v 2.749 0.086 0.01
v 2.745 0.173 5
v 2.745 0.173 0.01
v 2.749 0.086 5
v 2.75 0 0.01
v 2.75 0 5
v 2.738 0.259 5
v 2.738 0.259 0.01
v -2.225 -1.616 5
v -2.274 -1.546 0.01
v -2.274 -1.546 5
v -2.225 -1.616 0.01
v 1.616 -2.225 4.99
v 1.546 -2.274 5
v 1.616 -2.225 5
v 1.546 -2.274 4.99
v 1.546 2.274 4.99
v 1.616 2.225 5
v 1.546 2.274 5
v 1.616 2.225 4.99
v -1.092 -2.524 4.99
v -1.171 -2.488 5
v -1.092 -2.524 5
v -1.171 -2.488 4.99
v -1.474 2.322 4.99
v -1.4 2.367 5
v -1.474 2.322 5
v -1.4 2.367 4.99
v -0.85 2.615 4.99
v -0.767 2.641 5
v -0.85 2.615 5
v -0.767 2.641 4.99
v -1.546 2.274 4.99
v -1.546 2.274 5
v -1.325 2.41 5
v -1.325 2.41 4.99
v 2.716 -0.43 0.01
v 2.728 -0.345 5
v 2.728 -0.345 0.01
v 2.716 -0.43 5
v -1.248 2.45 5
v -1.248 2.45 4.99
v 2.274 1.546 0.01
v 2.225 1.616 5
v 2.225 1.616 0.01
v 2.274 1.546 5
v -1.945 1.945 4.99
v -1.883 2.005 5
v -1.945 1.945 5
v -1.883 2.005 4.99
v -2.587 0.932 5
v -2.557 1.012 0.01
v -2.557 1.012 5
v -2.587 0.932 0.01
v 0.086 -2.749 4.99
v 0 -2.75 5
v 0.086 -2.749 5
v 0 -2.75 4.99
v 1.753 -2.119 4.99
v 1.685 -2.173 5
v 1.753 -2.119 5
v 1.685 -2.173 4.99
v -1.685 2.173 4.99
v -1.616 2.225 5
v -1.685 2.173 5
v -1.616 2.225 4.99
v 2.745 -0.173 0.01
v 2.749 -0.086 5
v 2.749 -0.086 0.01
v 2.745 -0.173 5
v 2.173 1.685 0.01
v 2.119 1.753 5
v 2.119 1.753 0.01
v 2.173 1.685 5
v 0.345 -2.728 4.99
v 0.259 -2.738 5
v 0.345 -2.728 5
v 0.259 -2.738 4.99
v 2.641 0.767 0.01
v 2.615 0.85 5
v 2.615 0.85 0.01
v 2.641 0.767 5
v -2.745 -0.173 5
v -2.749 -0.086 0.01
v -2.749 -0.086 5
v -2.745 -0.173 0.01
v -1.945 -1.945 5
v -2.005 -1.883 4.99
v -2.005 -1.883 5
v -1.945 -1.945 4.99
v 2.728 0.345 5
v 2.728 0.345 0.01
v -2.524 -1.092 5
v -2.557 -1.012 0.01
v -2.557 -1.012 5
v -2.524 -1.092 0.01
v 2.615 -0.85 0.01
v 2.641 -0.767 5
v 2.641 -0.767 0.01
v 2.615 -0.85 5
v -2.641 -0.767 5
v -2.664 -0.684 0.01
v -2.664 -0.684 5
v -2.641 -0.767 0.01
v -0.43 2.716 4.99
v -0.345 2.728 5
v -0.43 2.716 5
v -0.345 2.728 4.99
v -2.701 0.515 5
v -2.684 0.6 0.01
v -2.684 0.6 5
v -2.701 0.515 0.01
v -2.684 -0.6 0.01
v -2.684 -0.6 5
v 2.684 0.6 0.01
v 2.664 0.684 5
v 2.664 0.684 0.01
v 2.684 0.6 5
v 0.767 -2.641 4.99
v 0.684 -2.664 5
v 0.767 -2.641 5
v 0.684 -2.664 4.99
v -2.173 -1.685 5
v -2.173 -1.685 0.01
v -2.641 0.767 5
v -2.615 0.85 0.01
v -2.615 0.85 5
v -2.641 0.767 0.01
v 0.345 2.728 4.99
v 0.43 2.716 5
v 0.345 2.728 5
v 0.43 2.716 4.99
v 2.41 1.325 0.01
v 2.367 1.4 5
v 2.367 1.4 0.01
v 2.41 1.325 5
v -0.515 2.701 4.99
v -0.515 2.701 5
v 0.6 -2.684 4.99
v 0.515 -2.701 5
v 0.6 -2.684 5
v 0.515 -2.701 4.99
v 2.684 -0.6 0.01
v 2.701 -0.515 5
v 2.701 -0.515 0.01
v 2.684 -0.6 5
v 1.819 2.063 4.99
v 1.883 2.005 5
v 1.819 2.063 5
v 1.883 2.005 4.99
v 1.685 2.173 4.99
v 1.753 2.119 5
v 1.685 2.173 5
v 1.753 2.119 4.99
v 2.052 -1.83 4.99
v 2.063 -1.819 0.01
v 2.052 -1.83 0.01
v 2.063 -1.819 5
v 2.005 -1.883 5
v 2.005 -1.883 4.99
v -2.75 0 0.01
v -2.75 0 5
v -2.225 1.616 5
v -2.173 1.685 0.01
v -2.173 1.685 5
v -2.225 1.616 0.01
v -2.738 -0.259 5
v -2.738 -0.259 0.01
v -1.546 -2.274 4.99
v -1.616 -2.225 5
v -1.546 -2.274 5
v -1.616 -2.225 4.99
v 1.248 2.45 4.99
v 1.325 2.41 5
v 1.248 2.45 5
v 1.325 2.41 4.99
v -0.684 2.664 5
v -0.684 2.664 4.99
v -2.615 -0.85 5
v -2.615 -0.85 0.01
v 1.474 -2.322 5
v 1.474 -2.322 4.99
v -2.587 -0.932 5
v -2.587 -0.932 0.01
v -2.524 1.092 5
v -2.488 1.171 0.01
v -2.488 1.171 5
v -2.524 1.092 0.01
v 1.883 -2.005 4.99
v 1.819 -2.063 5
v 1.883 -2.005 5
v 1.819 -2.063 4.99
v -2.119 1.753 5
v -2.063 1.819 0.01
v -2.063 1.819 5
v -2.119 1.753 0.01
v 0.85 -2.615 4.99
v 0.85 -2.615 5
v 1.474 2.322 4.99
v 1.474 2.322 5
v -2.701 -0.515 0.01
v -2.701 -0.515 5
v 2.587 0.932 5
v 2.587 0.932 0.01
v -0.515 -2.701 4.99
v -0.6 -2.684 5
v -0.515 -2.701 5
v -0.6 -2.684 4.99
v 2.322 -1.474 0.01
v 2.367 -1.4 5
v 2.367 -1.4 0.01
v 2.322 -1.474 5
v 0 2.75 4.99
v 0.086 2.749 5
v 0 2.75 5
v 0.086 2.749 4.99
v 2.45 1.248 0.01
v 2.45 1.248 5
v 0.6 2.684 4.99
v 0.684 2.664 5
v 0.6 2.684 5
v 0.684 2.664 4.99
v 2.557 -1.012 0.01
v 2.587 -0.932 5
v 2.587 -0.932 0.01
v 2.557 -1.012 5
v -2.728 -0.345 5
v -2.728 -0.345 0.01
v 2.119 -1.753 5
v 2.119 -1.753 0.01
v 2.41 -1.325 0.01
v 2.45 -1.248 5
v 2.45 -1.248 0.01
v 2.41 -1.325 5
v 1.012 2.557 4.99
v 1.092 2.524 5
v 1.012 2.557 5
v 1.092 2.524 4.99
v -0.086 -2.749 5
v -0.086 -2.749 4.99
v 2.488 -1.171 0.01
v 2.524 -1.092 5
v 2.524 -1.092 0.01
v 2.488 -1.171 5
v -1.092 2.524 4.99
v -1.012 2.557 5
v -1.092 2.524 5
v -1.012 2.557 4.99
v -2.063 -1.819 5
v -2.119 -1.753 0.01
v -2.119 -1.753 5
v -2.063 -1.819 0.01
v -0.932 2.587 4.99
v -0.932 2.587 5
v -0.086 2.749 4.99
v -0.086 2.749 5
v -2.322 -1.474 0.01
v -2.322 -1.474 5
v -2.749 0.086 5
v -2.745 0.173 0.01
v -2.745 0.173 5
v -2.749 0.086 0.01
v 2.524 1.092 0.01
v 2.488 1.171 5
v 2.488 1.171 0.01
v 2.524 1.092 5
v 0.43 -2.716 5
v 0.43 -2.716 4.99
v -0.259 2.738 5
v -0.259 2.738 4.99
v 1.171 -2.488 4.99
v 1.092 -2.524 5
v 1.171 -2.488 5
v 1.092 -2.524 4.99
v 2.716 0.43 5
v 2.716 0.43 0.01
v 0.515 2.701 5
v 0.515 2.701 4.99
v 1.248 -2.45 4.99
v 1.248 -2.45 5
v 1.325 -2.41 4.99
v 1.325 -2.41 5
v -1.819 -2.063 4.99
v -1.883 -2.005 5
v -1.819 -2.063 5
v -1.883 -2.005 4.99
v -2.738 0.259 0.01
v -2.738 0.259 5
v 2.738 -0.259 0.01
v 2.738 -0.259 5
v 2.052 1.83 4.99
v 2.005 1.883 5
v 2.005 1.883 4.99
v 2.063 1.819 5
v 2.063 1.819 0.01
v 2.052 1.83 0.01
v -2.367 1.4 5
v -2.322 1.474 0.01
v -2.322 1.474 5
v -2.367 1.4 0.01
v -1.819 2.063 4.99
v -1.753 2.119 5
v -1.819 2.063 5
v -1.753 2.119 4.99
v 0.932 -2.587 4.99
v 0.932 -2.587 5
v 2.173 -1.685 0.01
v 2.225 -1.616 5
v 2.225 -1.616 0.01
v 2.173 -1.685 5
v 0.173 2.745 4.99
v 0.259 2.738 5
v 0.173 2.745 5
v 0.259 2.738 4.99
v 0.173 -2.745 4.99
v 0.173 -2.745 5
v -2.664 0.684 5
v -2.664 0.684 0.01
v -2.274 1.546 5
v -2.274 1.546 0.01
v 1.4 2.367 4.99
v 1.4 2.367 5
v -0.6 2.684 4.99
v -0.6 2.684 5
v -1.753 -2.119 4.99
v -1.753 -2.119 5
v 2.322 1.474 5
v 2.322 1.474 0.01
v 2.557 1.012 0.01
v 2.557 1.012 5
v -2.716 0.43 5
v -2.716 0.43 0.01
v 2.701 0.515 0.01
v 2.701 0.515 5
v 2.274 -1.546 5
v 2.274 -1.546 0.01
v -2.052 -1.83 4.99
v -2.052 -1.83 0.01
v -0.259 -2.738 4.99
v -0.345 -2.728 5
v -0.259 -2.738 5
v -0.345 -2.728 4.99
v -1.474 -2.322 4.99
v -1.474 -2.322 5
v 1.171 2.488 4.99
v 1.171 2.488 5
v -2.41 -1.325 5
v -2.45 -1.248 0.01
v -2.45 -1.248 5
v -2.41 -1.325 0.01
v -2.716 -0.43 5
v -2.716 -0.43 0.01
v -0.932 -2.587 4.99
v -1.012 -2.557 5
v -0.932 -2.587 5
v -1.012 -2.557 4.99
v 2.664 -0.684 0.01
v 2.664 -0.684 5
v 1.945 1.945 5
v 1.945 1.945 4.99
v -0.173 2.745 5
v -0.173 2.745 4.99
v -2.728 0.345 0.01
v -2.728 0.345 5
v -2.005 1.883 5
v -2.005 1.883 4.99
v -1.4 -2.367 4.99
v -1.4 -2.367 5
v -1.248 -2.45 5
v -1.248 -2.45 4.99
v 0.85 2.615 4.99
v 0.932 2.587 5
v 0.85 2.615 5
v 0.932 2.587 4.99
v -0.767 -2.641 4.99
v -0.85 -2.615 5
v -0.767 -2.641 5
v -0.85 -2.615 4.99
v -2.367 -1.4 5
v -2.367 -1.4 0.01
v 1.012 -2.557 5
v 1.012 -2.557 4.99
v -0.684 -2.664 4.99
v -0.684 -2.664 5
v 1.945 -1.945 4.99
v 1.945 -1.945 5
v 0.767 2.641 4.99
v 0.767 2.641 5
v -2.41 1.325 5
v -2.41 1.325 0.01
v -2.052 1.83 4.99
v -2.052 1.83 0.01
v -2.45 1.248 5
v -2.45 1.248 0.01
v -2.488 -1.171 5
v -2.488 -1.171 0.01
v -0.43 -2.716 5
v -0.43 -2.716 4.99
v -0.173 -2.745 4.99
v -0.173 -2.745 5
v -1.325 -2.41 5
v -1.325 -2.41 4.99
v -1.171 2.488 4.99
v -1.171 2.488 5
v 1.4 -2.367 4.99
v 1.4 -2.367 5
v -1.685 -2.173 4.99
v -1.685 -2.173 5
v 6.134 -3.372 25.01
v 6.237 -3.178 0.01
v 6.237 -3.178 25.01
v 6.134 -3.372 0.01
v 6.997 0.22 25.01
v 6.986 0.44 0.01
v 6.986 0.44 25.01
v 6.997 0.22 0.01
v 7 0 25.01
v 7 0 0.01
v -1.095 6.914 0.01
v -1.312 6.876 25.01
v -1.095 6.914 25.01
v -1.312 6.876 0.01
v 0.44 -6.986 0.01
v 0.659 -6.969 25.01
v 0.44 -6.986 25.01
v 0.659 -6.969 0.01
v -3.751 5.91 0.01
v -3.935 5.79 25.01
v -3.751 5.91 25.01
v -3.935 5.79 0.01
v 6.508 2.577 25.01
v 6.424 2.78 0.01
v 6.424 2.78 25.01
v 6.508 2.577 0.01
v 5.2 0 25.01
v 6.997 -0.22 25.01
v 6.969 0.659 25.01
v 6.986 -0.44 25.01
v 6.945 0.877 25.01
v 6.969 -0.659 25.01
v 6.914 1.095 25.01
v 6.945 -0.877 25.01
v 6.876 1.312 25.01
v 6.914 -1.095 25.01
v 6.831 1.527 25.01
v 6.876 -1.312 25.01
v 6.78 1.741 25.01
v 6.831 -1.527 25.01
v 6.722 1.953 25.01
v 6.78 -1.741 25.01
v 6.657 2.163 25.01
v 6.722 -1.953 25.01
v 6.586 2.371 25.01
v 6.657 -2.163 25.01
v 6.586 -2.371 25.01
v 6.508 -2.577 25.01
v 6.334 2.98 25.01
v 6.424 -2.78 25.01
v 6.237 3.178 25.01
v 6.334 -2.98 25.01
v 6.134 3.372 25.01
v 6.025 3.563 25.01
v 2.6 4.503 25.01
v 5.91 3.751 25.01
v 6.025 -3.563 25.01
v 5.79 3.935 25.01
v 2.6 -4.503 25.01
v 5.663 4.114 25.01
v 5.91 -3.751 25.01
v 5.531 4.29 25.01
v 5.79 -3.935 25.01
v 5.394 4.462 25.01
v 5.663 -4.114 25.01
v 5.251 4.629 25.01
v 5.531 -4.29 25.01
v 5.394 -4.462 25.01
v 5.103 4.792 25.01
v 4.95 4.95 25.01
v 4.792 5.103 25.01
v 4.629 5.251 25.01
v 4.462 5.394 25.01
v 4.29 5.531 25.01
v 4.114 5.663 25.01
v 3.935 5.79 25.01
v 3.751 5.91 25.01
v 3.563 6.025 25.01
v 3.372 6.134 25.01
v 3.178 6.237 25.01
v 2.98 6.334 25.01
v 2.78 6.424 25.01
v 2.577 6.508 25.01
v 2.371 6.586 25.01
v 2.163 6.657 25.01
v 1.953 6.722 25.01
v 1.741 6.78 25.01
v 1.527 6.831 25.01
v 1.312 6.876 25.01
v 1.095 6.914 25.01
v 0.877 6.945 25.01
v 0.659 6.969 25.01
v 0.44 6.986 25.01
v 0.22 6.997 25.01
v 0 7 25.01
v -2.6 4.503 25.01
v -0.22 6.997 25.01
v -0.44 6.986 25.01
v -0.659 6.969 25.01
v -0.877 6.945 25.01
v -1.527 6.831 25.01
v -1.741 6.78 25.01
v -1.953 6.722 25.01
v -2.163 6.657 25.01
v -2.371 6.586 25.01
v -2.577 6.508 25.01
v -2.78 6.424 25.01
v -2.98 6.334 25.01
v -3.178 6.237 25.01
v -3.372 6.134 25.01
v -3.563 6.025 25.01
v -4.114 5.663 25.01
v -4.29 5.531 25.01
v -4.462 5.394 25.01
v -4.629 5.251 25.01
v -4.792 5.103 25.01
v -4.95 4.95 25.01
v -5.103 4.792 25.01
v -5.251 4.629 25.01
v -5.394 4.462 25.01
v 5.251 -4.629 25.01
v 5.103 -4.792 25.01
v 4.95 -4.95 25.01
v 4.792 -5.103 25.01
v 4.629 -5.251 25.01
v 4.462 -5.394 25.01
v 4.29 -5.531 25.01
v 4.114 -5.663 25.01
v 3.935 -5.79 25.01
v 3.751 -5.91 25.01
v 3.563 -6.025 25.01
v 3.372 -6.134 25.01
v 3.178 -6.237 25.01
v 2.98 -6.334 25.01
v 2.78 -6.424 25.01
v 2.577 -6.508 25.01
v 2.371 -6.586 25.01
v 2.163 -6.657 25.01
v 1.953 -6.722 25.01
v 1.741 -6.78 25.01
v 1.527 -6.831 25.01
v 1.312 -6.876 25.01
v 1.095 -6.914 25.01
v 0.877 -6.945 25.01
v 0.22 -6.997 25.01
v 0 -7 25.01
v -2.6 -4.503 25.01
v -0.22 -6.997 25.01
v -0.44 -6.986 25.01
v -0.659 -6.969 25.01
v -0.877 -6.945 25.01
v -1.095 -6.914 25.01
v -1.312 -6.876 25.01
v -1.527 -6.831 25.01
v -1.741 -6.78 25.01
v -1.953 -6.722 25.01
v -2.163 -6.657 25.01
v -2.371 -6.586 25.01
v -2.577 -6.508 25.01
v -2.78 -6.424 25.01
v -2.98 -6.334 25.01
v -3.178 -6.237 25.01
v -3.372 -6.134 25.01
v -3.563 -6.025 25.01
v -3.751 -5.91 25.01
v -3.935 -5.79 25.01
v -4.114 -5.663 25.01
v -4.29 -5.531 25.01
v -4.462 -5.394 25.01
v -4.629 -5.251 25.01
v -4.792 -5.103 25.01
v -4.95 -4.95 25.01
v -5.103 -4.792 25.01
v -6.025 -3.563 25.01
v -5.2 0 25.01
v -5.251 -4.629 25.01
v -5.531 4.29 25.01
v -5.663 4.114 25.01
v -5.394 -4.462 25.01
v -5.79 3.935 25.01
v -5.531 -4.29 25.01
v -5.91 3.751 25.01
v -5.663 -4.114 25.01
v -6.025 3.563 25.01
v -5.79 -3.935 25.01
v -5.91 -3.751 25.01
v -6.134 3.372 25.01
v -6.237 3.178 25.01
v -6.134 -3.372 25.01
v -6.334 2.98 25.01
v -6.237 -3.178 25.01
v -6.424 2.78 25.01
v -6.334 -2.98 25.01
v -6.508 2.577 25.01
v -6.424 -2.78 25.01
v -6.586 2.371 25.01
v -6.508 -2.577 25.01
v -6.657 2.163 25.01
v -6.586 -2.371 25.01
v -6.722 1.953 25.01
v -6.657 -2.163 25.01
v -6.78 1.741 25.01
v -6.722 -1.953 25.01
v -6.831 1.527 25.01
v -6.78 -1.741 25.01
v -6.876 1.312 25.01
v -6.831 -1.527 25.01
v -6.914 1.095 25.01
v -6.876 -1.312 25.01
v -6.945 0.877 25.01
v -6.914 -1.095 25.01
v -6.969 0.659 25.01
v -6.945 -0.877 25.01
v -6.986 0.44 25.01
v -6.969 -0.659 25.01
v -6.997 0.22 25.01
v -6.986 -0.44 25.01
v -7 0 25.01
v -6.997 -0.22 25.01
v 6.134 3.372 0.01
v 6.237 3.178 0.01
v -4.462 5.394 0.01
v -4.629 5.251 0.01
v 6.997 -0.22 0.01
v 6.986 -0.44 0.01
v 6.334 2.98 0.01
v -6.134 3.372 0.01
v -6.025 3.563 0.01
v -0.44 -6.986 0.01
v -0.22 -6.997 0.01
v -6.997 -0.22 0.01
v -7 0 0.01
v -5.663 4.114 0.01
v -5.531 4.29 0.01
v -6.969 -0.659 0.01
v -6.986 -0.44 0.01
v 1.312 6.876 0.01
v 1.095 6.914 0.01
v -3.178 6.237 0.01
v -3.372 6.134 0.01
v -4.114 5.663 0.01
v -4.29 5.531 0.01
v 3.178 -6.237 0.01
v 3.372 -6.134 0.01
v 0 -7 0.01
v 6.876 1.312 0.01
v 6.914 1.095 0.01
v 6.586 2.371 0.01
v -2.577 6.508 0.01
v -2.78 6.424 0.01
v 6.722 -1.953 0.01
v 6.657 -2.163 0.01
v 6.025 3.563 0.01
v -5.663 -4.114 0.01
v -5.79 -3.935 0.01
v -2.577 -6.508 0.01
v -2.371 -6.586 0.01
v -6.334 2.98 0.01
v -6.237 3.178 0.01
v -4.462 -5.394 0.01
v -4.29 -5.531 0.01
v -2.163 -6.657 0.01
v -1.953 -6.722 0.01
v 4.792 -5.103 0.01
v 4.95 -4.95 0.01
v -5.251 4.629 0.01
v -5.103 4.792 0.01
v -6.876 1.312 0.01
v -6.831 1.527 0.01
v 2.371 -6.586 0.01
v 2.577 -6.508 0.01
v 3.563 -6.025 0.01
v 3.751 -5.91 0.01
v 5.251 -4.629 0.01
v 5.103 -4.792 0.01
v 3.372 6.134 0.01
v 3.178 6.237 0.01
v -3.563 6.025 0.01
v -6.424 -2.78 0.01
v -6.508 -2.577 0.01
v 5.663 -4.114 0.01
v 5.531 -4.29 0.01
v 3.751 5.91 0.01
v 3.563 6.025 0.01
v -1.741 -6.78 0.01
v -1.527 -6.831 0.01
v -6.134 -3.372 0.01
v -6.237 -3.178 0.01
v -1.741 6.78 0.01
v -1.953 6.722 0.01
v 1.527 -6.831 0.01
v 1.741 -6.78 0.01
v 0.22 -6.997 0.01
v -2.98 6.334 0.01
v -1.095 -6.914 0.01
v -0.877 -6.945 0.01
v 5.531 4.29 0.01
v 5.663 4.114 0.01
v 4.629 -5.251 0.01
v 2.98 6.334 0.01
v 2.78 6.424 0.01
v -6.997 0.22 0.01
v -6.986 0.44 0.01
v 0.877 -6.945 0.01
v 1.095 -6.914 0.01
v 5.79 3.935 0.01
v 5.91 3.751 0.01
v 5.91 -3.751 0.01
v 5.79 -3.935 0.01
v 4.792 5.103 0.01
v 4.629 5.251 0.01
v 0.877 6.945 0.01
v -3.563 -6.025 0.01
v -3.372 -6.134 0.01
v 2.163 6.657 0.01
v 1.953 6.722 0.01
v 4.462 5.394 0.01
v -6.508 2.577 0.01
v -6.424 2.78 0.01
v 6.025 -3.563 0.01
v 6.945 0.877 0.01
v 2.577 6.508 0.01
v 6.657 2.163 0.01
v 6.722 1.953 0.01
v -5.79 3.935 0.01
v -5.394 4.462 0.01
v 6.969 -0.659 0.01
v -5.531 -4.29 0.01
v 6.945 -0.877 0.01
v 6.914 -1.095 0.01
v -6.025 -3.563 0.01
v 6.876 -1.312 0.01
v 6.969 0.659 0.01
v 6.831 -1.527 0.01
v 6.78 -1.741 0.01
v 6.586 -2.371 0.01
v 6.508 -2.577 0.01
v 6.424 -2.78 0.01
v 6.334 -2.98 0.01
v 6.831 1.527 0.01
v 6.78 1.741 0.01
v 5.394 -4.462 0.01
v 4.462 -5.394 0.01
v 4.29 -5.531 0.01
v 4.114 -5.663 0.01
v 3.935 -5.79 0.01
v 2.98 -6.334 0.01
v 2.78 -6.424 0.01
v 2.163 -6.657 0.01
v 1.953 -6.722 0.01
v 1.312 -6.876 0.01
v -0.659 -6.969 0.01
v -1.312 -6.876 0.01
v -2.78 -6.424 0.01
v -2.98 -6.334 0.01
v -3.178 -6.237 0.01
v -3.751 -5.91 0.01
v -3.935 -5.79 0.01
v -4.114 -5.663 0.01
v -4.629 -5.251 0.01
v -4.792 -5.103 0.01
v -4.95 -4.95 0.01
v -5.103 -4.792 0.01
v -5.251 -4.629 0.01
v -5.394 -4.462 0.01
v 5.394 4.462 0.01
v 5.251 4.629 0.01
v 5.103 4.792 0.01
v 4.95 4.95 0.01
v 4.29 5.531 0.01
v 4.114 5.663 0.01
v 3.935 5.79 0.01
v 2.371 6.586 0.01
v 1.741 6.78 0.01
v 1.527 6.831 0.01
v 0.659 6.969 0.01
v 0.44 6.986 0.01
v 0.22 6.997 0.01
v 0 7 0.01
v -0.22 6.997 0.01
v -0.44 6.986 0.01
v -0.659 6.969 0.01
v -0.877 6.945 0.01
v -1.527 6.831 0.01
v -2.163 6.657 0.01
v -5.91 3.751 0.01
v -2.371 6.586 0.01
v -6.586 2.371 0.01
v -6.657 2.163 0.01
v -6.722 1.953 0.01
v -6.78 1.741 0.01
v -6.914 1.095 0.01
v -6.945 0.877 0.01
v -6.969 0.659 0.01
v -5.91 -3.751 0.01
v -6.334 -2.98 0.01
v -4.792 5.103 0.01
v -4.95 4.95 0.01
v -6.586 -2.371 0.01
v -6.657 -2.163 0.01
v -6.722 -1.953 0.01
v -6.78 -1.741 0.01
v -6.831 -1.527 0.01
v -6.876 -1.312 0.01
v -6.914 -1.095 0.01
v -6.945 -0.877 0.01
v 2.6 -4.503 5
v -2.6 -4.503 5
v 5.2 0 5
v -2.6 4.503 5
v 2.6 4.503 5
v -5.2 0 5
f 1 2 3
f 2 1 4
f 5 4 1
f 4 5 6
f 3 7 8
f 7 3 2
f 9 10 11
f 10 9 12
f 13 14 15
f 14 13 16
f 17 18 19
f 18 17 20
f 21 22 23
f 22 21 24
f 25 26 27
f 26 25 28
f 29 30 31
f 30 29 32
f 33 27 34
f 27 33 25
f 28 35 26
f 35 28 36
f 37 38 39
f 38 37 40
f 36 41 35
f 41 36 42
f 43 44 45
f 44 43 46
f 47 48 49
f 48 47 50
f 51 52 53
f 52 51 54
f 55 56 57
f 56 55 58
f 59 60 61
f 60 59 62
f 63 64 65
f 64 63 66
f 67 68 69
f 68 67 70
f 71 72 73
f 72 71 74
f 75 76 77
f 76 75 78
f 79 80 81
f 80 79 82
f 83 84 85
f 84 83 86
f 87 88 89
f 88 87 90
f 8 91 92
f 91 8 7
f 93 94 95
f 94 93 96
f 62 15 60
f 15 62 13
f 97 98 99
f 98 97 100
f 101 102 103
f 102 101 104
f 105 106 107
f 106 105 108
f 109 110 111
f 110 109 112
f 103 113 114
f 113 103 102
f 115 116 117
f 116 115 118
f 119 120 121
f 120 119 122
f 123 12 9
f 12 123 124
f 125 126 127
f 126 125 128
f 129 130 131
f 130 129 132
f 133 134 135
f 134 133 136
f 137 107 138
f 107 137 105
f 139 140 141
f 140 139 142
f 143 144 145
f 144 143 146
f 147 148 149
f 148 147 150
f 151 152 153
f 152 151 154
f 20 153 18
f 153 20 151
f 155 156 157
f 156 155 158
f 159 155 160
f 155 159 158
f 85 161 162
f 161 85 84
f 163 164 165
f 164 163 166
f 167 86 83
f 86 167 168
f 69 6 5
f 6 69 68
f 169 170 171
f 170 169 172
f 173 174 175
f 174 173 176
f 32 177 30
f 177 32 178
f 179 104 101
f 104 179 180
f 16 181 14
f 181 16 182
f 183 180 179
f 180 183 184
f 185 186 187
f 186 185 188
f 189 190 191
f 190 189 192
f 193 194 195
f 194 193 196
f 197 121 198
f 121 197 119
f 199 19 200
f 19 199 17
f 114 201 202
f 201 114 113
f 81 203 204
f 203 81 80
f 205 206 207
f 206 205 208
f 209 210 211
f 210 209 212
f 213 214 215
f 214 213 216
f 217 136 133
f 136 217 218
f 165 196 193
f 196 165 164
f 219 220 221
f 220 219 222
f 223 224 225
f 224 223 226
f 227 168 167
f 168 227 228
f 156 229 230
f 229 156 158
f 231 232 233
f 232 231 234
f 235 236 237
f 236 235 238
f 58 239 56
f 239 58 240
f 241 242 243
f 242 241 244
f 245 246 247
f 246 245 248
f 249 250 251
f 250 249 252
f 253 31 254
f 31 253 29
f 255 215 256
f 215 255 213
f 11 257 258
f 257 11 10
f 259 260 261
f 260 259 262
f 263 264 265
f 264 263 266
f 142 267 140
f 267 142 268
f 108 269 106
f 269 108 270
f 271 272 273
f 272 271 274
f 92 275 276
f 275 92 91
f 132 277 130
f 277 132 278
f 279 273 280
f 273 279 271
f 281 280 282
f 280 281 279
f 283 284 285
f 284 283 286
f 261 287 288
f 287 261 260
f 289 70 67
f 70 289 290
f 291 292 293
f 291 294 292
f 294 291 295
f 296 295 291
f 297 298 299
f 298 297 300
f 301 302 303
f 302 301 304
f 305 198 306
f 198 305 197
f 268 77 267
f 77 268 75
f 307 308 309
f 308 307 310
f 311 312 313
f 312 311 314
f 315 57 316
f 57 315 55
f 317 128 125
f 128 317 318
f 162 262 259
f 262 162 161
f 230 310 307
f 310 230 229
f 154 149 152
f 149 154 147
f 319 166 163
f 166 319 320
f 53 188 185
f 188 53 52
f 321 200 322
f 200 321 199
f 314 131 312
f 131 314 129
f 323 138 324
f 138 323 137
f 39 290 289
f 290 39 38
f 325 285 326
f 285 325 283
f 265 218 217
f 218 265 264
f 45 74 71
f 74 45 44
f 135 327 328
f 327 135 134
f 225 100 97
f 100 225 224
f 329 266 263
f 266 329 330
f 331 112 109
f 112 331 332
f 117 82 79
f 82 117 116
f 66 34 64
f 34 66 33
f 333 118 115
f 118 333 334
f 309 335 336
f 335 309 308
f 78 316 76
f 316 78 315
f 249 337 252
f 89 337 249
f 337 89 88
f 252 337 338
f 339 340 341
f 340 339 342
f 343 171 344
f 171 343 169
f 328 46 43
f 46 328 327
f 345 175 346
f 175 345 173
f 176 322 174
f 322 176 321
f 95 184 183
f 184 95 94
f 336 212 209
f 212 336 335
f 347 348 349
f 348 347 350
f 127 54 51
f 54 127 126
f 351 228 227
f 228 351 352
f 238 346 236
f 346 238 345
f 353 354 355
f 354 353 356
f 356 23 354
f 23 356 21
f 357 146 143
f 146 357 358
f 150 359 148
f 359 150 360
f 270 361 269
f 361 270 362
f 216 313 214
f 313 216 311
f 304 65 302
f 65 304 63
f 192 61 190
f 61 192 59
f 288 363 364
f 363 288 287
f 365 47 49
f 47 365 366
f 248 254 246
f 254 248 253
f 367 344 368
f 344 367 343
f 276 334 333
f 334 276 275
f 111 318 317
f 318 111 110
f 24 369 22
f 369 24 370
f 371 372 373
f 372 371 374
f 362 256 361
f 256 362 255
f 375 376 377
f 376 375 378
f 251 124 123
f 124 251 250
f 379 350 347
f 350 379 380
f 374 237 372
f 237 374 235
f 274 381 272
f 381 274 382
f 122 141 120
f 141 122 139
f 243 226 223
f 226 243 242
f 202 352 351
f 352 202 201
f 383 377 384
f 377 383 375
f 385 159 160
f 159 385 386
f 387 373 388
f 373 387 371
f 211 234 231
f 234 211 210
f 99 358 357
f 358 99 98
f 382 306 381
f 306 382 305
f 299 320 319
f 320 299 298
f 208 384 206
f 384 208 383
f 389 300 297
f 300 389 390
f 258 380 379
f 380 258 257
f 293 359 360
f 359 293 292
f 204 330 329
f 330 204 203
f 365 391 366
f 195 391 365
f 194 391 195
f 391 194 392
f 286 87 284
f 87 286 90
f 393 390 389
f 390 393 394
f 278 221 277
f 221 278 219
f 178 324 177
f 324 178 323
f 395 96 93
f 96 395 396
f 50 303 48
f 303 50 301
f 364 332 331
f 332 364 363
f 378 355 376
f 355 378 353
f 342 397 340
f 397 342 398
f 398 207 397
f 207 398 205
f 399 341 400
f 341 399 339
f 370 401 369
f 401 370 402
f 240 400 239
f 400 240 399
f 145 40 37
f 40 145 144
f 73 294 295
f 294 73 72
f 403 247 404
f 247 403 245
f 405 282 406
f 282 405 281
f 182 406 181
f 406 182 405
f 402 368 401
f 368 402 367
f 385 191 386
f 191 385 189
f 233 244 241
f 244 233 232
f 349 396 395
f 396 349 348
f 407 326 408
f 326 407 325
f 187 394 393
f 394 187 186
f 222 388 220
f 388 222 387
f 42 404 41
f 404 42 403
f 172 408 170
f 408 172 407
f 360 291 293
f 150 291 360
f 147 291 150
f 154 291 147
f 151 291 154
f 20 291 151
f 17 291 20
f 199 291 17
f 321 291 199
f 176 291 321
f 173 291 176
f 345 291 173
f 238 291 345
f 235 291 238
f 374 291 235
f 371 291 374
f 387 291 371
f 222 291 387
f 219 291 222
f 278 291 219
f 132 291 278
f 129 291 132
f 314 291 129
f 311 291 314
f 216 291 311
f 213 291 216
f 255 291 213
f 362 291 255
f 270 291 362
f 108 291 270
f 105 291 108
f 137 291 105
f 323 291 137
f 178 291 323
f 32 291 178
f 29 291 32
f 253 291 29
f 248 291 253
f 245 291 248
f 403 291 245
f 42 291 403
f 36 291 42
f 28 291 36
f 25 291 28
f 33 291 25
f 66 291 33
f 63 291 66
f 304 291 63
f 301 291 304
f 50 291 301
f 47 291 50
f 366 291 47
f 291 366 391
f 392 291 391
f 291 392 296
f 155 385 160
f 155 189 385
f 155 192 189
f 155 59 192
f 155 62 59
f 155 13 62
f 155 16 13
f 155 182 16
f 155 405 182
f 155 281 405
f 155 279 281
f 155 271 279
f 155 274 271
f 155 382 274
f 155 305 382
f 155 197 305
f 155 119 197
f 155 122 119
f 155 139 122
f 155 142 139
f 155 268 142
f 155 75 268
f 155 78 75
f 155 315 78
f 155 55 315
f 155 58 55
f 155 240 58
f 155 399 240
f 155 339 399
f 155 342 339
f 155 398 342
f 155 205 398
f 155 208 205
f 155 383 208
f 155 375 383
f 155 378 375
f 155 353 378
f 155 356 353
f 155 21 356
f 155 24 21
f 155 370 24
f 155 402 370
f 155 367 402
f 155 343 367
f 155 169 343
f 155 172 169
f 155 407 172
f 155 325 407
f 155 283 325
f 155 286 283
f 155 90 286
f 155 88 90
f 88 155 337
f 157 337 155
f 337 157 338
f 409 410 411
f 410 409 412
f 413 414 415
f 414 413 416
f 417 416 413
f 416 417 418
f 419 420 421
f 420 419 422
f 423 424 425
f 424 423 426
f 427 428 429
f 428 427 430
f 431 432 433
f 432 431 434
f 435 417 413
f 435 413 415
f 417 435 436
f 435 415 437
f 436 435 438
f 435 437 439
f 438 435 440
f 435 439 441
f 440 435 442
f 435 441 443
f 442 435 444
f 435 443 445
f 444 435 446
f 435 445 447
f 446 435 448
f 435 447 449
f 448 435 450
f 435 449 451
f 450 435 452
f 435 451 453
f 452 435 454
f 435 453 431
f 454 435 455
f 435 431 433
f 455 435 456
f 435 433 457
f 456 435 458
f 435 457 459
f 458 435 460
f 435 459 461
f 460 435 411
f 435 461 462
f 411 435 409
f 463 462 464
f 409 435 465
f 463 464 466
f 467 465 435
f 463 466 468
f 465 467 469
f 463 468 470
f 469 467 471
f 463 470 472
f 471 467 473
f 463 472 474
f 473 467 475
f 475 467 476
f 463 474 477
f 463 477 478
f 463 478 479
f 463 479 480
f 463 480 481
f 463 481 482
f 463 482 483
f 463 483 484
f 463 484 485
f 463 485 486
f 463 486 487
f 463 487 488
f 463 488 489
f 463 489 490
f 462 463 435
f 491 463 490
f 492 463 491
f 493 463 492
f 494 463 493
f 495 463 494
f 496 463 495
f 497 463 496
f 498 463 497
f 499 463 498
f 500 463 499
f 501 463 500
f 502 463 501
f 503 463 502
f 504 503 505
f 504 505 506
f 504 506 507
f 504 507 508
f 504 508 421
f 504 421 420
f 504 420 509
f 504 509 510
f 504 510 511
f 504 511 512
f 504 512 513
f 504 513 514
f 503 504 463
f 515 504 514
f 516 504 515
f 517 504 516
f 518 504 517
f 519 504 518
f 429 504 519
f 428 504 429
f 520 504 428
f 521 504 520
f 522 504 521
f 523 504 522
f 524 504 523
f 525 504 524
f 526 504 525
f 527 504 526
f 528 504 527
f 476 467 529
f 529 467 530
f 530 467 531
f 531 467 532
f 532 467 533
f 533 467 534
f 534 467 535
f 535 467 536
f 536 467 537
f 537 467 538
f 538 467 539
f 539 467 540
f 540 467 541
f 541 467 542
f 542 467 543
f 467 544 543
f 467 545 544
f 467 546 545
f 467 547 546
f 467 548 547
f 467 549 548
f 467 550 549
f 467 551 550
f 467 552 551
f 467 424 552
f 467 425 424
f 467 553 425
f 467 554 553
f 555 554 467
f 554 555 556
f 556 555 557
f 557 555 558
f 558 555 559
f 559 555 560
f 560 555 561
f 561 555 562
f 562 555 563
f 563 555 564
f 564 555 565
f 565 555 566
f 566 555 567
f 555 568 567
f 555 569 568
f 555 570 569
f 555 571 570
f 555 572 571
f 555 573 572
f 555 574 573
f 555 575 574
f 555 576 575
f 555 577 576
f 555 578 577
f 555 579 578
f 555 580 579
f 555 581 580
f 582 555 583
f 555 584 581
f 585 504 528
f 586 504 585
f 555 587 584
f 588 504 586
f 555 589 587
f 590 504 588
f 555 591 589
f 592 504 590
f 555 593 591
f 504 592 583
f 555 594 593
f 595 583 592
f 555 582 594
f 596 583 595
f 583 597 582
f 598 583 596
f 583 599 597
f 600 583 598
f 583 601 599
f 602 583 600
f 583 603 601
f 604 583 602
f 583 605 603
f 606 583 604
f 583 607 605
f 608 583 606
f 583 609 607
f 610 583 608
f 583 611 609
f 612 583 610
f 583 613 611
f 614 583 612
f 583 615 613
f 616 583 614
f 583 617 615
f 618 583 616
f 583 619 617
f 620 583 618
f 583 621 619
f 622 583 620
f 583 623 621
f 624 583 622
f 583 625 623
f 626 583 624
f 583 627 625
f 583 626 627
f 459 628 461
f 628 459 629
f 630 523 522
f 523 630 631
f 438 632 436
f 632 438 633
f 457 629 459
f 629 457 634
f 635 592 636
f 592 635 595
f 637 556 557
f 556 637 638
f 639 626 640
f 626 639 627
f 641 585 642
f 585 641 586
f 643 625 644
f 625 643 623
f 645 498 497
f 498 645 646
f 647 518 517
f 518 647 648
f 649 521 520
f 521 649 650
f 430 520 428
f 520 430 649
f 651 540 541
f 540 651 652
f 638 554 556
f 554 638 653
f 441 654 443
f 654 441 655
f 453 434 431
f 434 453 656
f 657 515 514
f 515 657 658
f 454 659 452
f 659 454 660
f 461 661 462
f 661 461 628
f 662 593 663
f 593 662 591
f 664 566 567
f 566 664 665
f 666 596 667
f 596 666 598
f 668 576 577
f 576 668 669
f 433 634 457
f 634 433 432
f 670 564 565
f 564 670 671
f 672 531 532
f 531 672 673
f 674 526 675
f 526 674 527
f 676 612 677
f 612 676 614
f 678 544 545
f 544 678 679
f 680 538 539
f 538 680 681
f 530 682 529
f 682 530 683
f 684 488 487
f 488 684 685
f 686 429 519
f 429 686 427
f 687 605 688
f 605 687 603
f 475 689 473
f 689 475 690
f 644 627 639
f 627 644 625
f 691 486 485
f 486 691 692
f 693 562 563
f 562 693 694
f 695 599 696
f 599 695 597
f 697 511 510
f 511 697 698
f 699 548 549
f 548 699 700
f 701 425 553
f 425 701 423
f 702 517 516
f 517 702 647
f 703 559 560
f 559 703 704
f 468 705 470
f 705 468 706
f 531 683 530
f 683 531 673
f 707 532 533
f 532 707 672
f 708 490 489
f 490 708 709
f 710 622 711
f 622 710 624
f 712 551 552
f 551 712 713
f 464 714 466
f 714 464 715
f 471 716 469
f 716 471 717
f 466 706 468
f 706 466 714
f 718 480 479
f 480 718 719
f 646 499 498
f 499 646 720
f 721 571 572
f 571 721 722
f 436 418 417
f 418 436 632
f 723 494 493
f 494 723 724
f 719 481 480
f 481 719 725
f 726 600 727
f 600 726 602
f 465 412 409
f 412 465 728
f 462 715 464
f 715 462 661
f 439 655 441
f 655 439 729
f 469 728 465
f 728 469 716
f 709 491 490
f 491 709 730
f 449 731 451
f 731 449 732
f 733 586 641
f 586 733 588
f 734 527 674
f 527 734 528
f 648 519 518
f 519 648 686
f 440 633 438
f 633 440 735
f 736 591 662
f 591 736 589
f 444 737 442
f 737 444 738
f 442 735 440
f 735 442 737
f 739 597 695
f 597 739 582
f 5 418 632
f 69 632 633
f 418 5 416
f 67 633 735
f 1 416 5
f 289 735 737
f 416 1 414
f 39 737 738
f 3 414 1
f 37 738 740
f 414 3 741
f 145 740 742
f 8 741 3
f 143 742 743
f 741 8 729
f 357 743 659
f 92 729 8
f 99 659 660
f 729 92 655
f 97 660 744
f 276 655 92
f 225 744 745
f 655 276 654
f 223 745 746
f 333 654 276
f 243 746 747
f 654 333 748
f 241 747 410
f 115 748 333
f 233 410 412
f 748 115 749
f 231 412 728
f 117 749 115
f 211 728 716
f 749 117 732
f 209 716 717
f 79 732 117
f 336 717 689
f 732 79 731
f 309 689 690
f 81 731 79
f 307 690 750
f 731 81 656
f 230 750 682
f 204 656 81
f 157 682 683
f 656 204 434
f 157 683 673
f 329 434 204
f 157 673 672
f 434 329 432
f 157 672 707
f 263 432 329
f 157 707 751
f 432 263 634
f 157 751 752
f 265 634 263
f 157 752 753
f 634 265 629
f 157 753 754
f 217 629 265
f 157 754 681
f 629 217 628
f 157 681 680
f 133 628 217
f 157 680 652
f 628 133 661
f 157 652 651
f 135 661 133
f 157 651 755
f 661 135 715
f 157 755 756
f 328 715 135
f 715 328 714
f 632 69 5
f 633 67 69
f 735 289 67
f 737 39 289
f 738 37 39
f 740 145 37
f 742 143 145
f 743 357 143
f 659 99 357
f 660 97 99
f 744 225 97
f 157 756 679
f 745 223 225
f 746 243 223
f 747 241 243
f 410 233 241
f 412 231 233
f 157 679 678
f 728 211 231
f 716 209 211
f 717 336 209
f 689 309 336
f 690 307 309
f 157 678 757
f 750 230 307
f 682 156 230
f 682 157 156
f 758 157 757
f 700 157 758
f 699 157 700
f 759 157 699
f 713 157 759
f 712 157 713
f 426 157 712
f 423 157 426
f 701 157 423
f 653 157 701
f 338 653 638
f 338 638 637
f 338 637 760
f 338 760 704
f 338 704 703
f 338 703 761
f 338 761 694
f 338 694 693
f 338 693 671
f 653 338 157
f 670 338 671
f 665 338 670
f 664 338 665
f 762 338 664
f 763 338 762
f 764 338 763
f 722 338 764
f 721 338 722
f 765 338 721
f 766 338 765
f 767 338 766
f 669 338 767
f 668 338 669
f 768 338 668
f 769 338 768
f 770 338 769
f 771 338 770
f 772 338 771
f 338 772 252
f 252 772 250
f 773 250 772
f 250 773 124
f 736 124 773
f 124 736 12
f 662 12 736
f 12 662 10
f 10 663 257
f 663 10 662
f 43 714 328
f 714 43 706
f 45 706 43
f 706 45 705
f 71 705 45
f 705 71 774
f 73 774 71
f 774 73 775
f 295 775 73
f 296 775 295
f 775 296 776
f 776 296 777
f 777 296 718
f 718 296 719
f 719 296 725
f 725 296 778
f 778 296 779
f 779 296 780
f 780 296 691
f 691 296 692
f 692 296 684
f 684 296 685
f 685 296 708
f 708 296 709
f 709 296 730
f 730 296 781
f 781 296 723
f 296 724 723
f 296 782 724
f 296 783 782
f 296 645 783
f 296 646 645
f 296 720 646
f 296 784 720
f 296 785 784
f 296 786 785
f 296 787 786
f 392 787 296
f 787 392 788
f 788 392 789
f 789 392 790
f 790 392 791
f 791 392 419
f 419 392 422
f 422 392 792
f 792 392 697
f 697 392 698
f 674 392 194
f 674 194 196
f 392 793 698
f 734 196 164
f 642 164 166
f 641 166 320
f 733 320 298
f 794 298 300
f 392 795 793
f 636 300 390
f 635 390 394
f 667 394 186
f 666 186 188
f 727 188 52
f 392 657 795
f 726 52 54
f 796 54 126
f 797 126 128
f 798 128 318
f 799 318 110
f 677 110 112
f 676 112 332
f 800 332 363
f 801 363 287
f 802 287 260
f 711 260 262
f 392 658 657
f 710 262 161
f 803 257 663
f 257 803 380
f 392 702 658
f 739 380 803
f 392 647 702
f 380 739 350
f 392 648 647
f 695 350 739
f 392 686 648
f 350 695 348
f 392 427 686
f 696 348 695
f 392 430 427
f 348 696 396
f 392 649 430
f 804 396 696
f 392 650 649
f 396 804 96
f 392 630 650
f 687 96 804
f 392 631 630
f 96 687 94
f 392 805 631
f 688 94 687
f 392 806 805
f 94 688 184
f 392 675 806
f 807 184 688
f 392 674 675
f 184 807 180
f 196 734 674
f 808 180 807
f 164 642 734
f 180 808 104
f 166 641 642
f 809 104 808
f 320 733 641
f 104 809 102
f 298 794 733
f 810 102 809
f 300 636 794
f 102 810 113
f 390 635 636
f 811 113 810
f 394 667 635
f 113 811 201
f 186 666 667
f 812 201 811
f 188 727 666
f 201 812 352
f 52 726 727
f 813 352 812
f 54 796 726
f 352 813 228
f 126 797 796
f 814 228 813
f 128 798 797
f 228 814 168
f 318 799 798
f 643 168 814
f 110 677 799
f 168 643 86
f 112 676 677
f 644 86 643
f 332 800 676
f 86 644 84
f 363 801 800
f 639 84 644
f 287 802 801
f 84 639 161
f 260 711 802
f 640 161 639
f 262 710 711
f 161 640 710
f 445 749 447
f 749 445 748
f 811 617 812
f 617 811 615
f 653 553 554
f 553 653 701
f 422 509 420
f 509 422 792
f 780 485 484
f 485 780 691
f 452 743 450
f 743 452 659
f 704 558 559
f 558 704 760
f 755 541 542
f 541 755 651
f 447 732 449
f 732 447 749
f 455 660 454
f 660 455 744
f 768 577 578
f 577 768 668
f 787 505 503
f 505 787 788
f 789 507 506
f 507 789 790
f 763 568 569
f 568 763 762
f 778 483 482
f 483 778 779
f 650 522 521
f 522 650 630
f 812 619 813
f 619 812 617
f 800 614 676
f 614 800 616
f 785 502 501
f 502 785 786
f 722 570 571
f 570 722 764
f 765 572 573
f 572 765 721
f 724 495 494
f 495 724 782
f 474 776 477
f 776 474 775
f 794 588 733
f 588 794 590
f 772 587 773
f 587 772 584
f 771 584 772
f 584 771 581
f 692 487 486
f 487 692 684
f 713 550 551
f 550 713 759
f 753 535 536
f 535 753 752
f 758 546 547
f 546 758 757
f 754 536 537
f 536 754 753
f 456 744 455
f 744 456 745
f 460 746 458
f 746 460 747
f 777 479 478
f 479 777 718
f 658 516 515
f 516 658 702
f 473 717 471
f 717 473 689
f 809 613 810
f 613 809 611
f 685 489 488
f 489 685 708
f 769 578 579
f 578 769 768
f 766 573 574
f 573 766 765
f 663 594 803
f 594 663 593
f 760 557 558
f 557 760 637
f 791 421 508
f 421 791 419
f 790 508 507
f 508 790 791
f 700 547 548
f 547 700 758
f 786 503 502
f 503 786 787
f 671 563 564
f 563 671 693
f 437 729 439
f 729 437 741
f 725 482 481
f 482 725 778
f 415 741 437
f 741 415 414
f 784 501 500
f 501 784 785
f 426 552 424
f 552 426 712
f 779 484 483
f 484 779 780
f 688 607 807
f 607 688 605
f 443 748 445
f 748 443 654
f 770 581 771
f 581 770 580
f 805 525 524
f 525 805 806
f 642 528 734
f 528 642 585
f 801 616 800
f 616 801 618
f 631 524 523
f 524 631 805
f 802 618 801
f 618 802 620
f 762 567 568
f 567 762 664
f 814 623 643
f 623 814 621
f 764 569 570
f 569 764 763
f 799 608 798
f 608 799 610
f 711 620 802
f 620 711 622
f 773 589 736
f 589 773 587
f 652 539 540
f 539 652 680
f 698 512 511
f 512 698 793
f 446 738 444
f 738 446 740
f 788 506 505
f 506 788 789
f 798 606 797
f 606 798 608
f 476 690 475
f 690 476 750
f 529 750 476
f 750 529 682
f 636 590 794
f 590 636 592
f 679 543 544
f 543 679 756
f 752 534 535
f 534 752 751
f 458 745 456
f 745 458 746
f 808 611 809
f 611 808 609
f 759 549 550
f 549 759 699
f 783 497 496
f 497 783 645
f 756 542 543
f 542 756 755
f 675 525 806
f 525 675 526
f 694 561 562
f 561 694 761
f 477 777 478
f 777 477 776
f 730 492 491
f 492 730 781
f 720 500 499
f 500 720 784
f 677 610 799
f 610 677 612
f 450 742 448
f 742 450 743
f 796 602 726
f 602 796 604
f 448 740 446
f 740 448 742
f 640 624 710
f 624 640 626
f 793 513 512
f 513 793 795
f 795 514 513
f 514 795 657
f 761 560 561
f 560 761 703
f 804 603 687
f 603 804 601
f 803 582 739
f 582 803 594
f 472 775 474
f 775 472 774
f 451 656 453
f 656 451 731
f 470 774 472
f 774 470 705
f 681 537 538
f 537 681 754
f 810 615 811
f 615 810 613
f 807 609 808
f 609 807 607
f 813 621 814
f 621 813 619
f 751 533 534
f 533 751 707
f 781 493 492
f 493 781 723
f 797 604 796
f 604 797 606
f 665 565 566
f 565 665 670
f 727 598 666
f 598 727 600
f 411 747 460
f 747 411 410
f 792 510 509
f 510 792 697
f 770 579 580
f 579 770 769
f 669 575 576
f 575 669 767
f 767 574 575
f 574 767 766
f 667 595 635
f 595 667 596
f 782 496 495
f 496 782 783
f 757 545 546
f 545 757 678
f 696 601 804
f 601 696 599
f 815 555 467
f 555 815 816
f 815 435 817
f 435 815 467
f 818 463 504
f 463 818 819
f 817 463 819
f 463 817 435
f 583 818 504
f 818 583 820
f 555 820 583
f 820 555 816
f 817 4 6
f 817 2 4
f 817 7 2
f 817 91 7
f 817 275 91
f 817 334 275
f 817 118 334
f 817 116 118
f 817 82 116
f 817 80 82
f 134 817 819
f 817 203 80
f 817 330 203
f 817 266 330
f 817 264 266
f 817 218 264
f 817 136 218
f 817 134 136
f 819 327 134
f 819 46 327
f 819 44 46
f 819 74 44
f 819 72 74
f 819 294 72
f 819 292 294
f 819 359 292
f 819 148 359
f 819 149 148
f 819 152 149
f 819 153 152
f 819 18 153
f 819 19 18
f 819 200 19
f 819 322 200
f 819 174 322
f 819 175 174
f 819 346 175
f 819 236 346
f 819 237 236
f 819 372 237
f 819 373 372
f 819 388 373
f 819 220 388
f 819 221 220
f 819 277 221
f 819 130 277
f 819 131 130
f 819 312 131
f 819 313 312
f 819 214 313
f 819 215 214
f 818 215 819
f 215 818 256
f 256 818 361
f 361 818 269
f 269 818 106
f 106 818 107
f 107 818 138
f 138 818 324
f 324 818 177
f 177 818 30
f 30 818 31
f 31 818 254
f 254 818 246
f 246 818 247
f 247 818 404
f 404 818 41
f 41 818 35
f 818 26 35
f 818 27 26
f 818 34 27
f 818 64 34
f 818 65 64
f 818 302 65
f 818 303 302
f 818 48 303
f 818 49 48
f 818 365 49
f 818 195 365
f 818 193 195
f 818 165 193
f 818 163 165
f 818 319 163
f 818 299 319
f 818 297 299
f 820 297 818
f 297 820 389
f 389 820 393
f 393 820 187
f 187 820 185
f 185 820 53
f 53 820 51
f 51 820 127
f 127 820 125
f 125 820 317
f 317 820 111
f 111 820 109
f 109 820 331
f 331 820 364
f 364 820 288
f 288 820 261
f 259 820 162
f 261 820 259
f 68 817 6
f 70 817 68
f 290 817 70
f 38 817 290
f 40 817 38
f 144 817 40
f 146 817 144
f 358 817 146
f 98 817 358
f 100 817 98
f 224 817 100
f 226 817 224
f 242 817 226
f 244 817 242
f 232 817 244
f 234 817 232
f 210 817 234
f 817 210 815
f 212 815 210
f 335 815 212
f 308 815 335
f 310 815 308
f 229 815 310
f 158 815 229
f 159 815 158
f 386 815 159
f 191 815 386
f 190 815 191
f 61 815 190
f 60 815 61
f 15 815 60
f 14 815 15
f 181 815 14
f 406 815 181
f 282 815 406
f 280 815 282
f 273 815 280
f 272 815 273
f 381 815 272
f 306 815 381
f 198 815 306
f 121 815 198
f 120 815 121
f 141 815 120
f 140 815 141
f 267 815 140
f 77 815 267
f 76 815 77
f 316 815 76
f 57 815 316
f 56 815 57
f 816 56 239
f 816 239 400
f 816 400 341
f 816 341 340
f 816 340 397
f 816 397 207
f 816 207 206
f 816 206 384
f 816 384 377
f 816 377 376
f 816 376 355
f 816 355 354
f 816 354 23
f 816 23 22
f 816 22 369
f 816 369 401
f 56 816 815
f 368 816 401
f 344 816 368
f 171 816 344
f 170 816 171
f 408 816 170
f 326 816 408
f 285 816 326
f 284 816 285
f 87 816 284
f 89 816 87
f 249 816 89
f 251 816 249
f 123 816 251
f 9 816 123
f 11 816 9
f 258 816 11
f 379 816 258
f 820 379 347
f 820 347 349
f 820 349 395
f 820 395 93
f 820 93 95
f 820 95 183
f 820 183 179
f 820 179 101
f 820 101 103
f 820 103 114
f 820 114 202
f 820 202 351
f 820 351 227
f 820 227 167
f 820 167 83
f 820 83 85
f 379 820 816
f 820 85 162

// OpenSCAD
$fn=200;

// муфта
 difference(){
    rotate([0,0,0]) difference() {
    translate([0,0,0.01]) cylinder(h=25, d=14.0);
        difference() {
            cylinder(h=5.5,d=5.5);
            translate([0, (1.83 + 2.5), 2.49]) cube(5, center = true);
            translate([0, -(1.83 + 2.5), 2.49]) cube(5, center = true);
        }
    }
    translate([0,0,5]) cylinder(h=40, d=10.4, $fn=6);
};
